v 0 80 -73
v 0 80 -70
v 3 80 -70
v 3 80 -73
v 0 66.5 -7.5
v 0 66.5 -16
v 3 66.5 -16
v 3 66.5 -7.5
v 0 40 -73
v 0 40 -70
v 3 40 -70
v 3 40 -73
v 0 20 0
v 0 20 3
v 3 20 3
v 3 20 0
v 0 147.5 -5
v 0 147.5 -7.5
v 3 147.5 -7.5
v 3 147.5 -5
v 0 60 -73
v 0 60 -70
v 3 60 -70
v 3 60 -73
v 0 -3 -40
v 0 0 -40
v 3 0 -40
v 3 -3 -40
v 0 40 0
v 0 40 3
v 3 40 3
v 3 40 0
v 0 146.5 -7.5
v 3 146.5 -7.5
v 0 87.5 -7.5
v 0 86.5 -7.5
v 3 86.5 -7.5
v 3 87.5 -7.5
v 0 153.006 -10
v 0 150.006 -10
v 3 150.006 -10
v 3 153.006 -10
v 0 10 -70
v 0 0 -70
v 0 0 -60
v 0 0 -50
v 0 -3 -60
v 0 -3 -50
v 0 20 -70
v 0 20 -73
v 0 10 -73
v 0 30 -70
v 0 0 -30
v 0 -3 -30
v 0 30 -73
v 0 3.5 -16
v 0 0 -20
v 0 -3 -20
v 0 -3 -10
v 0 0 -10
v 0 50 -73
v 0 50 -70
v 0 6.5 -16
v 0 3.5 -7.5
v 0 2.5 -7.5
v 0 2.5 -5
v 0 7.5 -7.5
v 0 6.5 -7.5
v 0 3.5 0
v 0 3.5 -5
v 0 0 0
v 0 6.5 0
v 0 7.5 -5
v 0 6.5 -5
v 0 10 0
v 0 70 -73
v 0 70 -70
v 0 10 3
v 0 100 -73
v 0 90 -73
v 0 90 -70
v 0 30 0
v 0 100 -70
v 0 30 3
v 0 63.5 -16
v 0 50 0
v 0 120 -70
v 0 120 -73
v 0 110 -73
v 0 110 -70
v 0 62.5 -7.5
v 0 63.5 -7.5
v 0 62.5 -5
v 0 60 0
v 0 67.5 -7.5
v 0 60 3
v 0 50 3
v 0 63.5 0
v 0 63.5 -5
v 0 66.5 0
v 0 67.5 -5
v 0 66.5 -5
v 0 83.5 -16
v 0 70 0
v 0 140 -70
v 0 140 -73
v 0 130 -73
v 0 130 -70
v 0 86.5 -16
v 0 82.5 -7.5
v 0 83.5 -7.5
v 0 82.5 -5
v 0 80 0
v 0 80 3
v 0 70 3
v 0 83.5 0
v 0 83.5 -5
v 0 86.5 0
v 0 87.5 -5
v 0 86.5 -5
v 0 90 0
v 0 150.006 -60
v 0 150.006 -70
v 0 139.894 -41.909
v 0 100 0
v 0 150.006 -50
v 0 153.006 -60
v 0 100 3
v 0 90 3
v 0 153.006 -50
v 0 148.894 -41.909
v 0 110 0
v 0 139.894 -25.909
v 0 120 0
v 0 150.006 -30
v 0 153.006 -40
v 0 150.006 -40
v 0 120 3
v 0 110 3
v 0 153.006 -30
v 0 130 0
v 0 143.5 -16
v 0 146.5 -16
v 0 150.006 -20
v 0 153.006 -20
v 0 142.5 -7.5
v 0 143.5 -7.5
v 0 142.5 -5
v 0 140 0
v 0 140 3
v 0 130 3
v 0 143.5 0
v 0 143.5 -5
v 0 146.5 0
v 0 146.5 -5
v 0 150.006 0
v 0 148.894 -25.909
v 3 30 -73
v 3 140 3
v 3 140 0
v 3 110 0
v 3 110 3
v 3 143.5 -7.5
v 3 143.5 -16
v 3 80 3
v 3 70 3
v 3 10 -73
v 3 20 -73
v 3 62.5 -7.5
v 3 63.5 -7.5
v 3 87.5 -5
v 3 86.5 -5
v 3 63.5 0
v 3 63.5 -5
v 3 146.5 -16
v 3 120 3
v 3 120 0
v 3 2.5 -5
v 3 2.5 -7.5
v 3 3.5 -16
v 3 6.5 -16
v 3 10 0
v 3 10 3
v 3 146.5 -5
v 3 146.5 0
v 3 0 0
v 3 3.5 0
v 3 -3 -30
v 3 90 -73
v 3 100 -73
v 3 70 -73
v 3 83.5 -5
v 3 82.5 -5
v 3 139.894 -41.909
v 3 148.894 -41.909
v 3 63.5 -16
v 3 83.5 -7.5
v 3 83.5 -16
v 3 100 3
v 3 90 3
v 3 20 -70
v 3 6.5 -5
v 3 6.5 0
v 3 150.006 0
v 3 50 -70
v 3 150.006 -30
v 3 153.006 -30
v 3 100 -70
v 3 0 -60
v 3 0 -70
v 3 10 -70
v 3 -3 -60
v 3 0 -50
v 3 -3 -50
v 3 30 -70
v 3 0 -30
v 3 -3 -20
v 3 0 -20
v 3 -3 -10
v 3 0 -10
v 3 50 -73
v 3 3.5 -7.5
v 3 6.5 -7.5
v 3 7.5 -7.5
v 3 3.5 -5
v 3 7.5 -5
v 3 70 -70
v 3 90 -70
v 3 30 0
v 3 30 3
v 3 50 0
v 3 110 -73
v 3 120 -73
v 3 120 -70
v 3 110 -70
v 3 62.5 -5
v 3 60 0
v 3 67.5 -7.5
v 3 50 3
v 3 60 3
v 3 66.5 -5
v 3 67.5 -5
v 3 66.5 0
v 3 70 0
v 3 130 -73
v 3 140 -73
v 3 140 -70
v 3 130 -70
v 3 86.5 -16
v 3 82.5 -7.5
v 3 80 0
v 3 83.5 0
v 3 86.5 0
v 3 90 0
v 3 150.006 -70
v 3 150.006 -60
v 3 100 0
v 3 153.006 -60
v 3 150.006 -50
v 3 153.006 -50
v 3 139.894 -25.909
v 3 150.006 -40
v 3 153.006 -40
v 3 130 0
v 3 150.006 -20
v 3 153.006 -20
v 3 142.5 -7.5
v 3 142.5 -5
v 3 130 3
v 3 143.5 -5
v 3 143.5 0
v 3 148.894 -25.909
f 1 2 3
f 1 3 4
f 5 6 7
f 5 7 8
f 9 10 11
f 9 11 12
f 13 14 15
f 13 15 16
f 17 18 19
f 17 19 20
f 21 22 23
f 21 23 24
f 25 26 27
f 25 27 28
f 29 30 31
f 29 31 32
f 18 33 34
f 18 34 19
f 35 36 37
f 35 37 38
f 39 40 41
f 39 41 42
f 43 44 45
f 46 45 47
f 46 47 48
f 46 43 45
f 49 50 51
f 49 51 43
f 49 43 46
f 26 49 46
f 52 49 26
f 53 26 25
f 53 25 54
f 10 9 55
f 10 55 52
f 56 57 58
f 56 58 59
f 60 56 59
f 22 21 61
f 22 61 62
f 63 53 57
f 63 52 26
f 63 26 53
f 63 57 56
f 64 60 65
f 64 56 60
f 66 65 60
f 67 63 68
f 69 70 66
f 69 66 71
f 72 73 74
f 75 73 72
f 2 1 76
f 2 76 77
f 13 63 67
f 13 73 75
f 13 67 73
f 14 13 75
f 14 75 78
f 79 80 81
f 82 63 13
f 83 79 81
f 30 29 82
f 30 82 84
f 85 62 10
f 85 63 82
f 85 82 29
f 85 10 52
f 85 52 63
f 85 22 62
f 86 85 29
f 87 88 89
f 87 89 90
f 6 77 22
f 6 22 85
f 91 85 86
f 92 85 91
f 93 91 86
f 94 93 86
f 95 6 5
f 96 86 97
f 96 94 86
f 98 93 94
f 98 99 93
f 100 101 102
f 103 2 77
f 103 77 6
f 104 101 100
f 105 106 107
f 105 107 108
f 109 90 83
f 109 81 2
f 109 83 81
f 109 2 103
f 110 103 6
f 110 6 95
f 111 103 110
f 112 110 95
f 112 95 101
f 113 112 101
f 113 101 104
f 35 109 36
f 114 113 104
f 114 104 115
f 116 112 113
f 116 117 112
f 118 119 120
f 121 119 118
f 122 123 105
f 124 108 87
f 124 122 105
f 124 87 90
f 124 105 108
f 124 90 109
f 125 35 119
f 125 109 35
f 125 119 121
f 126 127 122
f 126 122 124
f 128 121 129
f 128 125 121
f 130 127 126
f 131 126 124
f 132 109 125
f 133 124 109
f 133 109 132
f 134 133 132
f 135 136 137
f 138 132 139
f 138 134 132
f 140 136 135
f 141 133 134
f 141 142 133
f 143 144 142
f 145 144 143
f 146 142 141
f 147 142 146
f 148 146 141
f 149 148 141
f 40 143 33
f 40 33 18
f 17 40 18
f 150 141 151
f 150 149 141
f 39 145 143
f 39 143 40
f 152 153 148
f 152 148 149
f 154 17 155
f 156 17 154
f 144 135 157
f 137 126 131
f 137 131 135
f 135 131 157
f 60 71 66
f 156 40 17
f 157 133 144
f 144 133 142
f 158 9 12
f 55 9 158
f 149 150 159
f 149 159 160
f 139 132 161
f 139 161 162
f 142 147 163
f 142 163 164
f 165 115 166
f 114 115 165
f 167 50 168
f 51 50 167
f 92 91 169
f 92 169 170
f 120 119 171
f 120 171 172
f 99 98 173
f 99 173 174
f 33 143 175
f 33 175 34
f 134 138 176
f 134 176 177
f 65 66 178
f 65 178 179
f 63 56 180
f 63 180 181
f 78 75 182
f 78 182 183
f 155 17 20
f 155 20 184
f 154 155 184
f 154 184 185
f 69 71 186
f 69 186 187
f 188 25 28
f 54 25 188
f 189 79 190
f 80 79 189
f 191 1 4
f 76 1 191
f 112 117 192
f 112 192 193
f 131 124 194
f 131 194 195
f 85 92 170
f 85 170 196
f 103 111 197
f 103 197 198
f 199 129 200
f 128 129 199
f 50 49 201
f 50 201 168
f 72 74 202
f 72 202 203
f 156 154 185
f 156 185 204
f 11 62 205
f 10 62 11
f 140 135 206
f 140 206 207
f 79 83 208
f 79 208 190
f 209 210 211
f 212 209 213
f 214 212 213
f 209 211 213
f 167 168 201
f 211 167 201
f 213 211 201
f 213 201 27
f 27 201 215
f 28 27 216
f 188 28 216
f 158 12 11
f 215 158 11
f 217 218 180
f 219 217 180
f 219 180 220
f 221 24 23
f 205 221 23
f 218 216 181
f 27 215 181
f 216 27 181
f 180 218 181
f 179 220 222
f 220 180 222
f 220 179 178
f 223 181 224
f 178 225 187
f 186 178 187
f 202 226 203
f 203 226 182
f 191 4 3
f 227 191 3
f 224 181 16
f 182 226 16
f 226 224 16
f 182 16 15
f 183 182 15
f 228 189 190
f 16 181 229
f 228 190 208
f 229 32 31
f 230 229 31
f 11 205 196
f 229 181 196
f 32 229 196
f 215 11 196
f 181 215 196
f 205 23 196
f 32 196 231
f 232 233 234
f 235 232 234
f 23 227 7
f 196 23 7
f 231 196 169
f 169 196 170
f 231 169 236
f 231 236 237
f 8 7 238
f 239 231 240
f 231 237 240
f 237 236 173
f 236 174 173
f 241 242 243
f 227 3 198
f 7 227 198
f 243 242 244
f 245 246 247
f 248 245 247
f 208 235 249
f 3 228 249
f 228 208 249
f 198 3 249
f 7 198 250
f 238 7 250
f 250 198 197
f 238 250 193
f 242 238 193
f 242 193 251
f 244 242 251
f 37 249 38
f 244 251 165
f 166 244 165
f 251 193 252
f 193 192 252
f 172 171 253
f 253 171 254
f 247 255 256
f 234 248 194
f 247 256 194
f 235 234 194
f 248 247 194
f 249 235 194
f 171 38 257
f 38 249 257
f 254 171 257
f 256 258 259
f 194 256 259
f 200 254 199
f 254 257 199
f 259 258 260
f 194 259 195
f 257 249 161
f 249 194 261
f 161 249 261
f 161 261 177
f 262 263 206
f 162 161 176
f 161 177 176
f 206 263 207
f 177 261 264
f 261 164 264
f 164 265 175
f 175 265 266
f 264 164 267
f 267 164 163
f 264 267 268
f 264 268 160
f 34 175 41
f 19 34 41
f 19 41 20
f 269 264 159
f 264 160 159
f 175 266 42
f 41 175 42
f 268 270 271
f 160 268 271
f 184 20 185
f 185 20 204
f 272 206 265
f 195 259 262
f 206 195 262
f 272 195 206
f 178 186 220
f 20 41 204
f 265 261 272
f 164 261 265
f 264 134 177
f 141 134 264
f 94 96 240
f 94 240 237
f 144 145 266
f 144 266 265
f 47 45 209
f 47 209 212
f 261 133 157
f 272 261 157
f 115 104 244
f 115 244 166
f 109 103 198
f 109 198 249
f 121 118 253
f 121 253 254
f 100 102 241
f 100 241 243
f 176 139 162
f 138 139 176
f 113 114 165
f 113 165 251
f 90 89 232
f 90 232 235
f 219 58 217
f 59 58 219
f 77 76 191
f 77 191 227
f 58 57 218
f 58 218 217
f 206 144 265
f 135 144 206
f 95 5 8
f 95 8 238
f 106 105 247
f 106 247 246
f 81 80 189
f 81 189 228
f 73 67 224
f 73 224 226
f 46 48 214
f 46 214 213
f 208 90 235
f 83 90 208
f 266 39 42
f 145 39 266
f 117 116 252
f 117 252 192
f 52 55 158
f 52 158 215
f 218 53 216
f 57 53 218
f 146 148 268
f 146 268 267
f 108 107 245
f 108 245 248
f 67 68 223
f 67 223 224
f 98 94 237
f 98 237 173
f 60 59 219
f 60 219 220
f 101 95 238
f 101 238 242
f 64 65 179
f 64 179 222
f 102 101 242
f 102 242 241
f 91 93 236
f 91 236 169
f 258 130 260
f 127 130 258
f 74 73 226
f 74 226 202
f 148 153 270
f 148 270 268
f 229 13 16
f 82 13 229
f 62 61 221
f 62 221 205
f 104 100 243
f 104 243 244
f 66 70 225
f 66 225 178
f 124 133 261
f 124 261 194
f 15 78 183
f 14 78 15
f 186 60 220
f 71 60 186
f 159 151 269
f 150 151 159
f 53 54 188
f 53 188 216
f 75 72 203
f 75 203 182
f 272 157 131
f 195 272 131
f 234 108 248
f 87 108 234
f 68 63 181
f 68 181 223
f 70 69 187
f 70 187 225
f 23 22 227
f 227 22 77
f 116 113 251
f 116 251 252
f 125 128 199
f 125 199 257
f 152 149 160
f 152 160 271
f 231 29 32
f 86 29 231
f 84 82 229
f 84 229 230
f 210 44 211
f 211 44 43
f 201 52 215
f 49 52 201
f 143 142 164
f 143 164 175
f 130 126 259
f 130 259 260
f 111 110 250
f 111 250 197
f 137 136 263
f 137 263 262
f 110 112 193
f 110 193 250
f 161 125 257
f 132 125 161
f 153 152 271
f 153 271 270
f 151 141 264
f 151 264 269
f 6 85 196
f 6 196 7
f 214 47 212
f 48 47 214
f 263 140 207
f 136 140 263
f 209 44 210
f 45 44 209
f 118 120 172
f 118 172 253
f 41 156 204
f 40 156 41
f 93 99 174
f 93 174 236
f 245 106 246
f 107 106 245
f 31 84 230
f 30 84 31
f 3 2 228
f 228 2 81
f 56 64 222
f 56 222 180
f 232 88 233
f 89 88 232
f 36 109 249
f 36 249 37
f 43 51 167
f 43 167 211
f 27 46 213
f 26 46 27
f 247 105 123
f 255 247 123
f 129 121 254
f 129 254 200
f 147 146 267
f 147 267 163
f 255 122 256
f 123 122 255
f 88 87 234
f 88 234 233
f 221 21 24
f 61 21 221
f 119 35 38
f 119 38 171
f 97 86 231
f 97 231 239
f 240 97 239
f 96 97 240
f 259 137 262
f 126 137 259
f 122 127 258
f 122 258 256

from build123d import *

# Parameters (mm, degrees)
SKETCH1_W           = 16
SKETCH1_H           = 9
BOSS_EXTRUDE1_DEPTH = 3


with BuildPart() as part:
    # Sketch1 → Boss-Extrude1 (new body)
    with BuildSketch(Plane(origin=(0, 0, 0), x_dir=(0, 0, -1), z_dir=(1, 0, 0))):
        Polygon((10, 153.005875518), (20, 153.005875518), (20, 150.005875518), (30, 150.005875518), (30, 153.005875518), (40, 153.005875518), (40, 150.005875518), (50, 150.005875518), (50, 153.005875518), (60, 153.005875518), (60, 150.005875518), (70, 150.005875518), (70, 146.5), (70, 143.5), (70, 140), (73, 140), (73, 130), (70, 130), (70, 120), (73, 120), (73, 110), (70, 110), (70, 100), (73, 100), (73, 90), (70, 90), (70, 83.5), (70, 80), (73, 80), (73, 70), (70, 70), (70, 66.5), (70, 63.5), (70, 60), (73, 60), (73, 50), (70, 50), (70, 40), (73, 40), (73, 30), (70, 30), (70, 20), (73, 20), (73, 10), (70, 10), (70, 6.5), (70, 3.5), (70, 0), (60, 0), (60, -3), (50, -3), (50, 0), (40, 0), (40, -3), (30, -3), (30, 0), (20, 0), (20, -3), (10, -3), (10, 0), (0, 0), (0, 3.5), (5, 3.5), (5, 2.5), (7.5, 2.5), (7.5, 3.5), (16, 3.5), (16, 6.5), (7.5, 6.5), (7.5, 7.5), (5, 7.5), (5, 6.5), (0, 6.5), (0, 10), (-3, 10), (-3, 20), (0, 20), (0, 30), (-3, 30), (-3, 40), (0, 40), (0, 50), (-3, 50), (-3, 60), (0, 60), (0, 63.5), (5, 63.5), (5, 62.5), (7.5, 62.5), (7.5, 63.5), (16, 63.5), (16, 66.5), (7.5, 66.5), (7.5, 67.5), (5, 67.5), (5, 66.5), (0, 66.5), (0, 70), (-3, 70), (-3, 80), (0, 80), (0, 83.5), (5, 83.5), (5, 82.5), (7.5, 82.5), (7.5, 83.5), (16, 83.5), (16, 86.5), (7.5, 86.5), (7.5, 87.5), (5, 87.5), (5, 86.5), (0, 86.5), (0, 90), (-3, 90), (-3, 100), (0, 100), (0, 110), (-3, 110), (-3, 120), (0, 120), (0, 130), (-3, 130), (-3, 140), (0, 140), (0, 143.5), (5, 143.5), (5, 142.5), (7.5, 142.5), (7.5, 143.5), (16, 143.5), (16, 146.5), (7.5, 146.5), (7.5, 147.5), (5, 147.5), (5, 146.5), (0, 146.5), (0, 150.005875518), (10, 150.005875518), align=None)
        with Locations((33.90899457, 144.39356925)):
            Rectangle(SKETCH1_W, SKETCH1_H, mode=Mode.SUBTRACT)
    extrude(amount=BOSS_EXTRUDE1_DEPTH)


solid = part.part
